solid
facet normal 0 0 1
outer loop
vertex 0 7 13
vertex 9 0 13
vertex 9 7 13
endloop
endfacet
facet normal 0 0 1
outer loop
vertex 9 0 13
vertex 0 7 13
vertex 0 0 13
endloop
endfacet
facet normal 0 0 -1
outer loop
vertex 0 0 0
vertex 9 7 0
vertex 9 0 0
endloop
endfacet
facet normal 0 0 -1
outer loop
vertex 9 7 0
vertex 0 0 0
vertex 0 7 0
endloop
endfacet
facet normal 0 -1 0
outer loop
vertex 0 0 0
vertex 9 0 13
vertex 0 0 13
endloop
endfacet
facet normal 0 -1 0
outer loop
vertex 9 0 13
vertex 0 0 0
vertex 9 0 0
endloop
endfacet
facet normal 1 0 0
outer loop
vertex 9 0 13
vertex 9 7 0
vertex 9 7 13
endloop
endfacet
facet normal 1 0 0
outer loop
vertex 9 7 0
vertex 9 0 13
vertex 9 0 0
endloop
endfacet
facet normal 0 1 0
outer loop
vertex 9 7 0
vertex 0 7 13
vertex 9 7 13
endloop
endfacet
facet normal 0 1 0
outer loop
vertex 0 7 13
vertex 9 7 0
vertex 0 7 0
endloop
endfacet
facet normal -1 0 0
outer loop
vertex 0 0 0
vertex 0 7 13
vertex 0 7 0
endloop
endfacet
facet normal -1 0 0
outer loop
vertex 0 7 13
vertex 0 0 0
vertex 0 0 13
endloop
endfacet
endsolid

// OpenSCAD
// Generated by SolidPython 1.0.1 on 2020-07-29 00:46:55


cube(size = [9, 7, 13]);
/***********************************************
*********      SolidPython code:      **********
************************************************
 
# import packages: SolidPython
from solid import *
from solid.utils import *
from itertools import chain, combinations, permutations


class Resize:

    def __init__(self, scad_file):
        self.scad_file = scad_file
        #self.scad_file = import_scad(scad_file)
        # cone/cylinder param:
        self.r1 = 0
        self.r2 = 0
        self.h = 0
        # rectangular prism param:
        self.w = 0
        self.l = 0
        # ellipse param:
        self.r = 0

    # import OpenScad code (file name corresponds to shape)


    # classify shape + parameters
    def assign(self, param1, param2, param3):
        if self.scad_file == 'cone.scad':
            self.r1 = param1
            self.r2 = param2
            self.h = param3
        elif self.scad_file == 'cylinder.scad':
            self.r1 = param1
            self.r2 = param2
            self.h = param3
        elif self.scad_file == 'rectangularPrism.scad':
            self.h = param1
            self.l = param2
            self.w = param3
        else:
            self.r = param1
            self.h = param2

    # resize parameters
    def iterate(self):
        x = range(3, 20, 2)
        i = 1
        if self.scad_file == 'cone.scad':
            tempList = list(permutations(x, 2))
            for temp in tempList:
                param1 = temp[0]
                param2 = temp[1]
                filepath = 'produced_scad_files/' + 'cone' + str(param1) + '_' + str(param2) + '_' + '.scad'
                scad_render_to_file(cylinder(h=param1, r1=param2, r2=0), filepath)

        elif self.scad_file == 'cylinder.scad':
            tempList = list(permutations(x, 3))
            for temp in tempList:
                param1 = temp[0]
                param2 = temp[1]
                filepath = 'produced_scad_files/' + 'cylinder' + str(param1) + '_' + str(param2) + '_' + '.scad'
                scad_render_to_file(cylinder(h=param1, r1=param2, r2=param2), filepath)

        elif self.scad_file == 'rectangularPrism.scad':
            tempList = list(permutations(x, 3))
            for temp in tempList:
                param1 = temp[0]
                param2 = temp[1]
                param3 = temp[2]
                filepath = 'produced_scad_files/' + 'rectangularPrism' + str(param1) + '_' + str(param2) + '_' + str(
                    param3) + '.scad'
                scad_render_to_file(cube(size=(param1, param2, param3)), filepath)

        elif self.scad_file == 'ellipse.scad':
            tempList = list(permutations(x, 4))
            for temp in tempList:
                param1 = temp[0]
                param2 = temp[1]
                param3 = temp[2]
                param4 = temp[3]
                filepath = 'produced_scad_files/' + 'ellipse' + str(param1) + '_' + str(param2) + '_' + str(param3) + '_' + str(param4) + '.scad'
                scad_render_to_file(scale([param1, param2, param3])(sphere(r=param4)), filepath)

    def render_to_scadfile(self):
        scad_render_to_file(scad, 'example.scad') 
 
************************************************/
